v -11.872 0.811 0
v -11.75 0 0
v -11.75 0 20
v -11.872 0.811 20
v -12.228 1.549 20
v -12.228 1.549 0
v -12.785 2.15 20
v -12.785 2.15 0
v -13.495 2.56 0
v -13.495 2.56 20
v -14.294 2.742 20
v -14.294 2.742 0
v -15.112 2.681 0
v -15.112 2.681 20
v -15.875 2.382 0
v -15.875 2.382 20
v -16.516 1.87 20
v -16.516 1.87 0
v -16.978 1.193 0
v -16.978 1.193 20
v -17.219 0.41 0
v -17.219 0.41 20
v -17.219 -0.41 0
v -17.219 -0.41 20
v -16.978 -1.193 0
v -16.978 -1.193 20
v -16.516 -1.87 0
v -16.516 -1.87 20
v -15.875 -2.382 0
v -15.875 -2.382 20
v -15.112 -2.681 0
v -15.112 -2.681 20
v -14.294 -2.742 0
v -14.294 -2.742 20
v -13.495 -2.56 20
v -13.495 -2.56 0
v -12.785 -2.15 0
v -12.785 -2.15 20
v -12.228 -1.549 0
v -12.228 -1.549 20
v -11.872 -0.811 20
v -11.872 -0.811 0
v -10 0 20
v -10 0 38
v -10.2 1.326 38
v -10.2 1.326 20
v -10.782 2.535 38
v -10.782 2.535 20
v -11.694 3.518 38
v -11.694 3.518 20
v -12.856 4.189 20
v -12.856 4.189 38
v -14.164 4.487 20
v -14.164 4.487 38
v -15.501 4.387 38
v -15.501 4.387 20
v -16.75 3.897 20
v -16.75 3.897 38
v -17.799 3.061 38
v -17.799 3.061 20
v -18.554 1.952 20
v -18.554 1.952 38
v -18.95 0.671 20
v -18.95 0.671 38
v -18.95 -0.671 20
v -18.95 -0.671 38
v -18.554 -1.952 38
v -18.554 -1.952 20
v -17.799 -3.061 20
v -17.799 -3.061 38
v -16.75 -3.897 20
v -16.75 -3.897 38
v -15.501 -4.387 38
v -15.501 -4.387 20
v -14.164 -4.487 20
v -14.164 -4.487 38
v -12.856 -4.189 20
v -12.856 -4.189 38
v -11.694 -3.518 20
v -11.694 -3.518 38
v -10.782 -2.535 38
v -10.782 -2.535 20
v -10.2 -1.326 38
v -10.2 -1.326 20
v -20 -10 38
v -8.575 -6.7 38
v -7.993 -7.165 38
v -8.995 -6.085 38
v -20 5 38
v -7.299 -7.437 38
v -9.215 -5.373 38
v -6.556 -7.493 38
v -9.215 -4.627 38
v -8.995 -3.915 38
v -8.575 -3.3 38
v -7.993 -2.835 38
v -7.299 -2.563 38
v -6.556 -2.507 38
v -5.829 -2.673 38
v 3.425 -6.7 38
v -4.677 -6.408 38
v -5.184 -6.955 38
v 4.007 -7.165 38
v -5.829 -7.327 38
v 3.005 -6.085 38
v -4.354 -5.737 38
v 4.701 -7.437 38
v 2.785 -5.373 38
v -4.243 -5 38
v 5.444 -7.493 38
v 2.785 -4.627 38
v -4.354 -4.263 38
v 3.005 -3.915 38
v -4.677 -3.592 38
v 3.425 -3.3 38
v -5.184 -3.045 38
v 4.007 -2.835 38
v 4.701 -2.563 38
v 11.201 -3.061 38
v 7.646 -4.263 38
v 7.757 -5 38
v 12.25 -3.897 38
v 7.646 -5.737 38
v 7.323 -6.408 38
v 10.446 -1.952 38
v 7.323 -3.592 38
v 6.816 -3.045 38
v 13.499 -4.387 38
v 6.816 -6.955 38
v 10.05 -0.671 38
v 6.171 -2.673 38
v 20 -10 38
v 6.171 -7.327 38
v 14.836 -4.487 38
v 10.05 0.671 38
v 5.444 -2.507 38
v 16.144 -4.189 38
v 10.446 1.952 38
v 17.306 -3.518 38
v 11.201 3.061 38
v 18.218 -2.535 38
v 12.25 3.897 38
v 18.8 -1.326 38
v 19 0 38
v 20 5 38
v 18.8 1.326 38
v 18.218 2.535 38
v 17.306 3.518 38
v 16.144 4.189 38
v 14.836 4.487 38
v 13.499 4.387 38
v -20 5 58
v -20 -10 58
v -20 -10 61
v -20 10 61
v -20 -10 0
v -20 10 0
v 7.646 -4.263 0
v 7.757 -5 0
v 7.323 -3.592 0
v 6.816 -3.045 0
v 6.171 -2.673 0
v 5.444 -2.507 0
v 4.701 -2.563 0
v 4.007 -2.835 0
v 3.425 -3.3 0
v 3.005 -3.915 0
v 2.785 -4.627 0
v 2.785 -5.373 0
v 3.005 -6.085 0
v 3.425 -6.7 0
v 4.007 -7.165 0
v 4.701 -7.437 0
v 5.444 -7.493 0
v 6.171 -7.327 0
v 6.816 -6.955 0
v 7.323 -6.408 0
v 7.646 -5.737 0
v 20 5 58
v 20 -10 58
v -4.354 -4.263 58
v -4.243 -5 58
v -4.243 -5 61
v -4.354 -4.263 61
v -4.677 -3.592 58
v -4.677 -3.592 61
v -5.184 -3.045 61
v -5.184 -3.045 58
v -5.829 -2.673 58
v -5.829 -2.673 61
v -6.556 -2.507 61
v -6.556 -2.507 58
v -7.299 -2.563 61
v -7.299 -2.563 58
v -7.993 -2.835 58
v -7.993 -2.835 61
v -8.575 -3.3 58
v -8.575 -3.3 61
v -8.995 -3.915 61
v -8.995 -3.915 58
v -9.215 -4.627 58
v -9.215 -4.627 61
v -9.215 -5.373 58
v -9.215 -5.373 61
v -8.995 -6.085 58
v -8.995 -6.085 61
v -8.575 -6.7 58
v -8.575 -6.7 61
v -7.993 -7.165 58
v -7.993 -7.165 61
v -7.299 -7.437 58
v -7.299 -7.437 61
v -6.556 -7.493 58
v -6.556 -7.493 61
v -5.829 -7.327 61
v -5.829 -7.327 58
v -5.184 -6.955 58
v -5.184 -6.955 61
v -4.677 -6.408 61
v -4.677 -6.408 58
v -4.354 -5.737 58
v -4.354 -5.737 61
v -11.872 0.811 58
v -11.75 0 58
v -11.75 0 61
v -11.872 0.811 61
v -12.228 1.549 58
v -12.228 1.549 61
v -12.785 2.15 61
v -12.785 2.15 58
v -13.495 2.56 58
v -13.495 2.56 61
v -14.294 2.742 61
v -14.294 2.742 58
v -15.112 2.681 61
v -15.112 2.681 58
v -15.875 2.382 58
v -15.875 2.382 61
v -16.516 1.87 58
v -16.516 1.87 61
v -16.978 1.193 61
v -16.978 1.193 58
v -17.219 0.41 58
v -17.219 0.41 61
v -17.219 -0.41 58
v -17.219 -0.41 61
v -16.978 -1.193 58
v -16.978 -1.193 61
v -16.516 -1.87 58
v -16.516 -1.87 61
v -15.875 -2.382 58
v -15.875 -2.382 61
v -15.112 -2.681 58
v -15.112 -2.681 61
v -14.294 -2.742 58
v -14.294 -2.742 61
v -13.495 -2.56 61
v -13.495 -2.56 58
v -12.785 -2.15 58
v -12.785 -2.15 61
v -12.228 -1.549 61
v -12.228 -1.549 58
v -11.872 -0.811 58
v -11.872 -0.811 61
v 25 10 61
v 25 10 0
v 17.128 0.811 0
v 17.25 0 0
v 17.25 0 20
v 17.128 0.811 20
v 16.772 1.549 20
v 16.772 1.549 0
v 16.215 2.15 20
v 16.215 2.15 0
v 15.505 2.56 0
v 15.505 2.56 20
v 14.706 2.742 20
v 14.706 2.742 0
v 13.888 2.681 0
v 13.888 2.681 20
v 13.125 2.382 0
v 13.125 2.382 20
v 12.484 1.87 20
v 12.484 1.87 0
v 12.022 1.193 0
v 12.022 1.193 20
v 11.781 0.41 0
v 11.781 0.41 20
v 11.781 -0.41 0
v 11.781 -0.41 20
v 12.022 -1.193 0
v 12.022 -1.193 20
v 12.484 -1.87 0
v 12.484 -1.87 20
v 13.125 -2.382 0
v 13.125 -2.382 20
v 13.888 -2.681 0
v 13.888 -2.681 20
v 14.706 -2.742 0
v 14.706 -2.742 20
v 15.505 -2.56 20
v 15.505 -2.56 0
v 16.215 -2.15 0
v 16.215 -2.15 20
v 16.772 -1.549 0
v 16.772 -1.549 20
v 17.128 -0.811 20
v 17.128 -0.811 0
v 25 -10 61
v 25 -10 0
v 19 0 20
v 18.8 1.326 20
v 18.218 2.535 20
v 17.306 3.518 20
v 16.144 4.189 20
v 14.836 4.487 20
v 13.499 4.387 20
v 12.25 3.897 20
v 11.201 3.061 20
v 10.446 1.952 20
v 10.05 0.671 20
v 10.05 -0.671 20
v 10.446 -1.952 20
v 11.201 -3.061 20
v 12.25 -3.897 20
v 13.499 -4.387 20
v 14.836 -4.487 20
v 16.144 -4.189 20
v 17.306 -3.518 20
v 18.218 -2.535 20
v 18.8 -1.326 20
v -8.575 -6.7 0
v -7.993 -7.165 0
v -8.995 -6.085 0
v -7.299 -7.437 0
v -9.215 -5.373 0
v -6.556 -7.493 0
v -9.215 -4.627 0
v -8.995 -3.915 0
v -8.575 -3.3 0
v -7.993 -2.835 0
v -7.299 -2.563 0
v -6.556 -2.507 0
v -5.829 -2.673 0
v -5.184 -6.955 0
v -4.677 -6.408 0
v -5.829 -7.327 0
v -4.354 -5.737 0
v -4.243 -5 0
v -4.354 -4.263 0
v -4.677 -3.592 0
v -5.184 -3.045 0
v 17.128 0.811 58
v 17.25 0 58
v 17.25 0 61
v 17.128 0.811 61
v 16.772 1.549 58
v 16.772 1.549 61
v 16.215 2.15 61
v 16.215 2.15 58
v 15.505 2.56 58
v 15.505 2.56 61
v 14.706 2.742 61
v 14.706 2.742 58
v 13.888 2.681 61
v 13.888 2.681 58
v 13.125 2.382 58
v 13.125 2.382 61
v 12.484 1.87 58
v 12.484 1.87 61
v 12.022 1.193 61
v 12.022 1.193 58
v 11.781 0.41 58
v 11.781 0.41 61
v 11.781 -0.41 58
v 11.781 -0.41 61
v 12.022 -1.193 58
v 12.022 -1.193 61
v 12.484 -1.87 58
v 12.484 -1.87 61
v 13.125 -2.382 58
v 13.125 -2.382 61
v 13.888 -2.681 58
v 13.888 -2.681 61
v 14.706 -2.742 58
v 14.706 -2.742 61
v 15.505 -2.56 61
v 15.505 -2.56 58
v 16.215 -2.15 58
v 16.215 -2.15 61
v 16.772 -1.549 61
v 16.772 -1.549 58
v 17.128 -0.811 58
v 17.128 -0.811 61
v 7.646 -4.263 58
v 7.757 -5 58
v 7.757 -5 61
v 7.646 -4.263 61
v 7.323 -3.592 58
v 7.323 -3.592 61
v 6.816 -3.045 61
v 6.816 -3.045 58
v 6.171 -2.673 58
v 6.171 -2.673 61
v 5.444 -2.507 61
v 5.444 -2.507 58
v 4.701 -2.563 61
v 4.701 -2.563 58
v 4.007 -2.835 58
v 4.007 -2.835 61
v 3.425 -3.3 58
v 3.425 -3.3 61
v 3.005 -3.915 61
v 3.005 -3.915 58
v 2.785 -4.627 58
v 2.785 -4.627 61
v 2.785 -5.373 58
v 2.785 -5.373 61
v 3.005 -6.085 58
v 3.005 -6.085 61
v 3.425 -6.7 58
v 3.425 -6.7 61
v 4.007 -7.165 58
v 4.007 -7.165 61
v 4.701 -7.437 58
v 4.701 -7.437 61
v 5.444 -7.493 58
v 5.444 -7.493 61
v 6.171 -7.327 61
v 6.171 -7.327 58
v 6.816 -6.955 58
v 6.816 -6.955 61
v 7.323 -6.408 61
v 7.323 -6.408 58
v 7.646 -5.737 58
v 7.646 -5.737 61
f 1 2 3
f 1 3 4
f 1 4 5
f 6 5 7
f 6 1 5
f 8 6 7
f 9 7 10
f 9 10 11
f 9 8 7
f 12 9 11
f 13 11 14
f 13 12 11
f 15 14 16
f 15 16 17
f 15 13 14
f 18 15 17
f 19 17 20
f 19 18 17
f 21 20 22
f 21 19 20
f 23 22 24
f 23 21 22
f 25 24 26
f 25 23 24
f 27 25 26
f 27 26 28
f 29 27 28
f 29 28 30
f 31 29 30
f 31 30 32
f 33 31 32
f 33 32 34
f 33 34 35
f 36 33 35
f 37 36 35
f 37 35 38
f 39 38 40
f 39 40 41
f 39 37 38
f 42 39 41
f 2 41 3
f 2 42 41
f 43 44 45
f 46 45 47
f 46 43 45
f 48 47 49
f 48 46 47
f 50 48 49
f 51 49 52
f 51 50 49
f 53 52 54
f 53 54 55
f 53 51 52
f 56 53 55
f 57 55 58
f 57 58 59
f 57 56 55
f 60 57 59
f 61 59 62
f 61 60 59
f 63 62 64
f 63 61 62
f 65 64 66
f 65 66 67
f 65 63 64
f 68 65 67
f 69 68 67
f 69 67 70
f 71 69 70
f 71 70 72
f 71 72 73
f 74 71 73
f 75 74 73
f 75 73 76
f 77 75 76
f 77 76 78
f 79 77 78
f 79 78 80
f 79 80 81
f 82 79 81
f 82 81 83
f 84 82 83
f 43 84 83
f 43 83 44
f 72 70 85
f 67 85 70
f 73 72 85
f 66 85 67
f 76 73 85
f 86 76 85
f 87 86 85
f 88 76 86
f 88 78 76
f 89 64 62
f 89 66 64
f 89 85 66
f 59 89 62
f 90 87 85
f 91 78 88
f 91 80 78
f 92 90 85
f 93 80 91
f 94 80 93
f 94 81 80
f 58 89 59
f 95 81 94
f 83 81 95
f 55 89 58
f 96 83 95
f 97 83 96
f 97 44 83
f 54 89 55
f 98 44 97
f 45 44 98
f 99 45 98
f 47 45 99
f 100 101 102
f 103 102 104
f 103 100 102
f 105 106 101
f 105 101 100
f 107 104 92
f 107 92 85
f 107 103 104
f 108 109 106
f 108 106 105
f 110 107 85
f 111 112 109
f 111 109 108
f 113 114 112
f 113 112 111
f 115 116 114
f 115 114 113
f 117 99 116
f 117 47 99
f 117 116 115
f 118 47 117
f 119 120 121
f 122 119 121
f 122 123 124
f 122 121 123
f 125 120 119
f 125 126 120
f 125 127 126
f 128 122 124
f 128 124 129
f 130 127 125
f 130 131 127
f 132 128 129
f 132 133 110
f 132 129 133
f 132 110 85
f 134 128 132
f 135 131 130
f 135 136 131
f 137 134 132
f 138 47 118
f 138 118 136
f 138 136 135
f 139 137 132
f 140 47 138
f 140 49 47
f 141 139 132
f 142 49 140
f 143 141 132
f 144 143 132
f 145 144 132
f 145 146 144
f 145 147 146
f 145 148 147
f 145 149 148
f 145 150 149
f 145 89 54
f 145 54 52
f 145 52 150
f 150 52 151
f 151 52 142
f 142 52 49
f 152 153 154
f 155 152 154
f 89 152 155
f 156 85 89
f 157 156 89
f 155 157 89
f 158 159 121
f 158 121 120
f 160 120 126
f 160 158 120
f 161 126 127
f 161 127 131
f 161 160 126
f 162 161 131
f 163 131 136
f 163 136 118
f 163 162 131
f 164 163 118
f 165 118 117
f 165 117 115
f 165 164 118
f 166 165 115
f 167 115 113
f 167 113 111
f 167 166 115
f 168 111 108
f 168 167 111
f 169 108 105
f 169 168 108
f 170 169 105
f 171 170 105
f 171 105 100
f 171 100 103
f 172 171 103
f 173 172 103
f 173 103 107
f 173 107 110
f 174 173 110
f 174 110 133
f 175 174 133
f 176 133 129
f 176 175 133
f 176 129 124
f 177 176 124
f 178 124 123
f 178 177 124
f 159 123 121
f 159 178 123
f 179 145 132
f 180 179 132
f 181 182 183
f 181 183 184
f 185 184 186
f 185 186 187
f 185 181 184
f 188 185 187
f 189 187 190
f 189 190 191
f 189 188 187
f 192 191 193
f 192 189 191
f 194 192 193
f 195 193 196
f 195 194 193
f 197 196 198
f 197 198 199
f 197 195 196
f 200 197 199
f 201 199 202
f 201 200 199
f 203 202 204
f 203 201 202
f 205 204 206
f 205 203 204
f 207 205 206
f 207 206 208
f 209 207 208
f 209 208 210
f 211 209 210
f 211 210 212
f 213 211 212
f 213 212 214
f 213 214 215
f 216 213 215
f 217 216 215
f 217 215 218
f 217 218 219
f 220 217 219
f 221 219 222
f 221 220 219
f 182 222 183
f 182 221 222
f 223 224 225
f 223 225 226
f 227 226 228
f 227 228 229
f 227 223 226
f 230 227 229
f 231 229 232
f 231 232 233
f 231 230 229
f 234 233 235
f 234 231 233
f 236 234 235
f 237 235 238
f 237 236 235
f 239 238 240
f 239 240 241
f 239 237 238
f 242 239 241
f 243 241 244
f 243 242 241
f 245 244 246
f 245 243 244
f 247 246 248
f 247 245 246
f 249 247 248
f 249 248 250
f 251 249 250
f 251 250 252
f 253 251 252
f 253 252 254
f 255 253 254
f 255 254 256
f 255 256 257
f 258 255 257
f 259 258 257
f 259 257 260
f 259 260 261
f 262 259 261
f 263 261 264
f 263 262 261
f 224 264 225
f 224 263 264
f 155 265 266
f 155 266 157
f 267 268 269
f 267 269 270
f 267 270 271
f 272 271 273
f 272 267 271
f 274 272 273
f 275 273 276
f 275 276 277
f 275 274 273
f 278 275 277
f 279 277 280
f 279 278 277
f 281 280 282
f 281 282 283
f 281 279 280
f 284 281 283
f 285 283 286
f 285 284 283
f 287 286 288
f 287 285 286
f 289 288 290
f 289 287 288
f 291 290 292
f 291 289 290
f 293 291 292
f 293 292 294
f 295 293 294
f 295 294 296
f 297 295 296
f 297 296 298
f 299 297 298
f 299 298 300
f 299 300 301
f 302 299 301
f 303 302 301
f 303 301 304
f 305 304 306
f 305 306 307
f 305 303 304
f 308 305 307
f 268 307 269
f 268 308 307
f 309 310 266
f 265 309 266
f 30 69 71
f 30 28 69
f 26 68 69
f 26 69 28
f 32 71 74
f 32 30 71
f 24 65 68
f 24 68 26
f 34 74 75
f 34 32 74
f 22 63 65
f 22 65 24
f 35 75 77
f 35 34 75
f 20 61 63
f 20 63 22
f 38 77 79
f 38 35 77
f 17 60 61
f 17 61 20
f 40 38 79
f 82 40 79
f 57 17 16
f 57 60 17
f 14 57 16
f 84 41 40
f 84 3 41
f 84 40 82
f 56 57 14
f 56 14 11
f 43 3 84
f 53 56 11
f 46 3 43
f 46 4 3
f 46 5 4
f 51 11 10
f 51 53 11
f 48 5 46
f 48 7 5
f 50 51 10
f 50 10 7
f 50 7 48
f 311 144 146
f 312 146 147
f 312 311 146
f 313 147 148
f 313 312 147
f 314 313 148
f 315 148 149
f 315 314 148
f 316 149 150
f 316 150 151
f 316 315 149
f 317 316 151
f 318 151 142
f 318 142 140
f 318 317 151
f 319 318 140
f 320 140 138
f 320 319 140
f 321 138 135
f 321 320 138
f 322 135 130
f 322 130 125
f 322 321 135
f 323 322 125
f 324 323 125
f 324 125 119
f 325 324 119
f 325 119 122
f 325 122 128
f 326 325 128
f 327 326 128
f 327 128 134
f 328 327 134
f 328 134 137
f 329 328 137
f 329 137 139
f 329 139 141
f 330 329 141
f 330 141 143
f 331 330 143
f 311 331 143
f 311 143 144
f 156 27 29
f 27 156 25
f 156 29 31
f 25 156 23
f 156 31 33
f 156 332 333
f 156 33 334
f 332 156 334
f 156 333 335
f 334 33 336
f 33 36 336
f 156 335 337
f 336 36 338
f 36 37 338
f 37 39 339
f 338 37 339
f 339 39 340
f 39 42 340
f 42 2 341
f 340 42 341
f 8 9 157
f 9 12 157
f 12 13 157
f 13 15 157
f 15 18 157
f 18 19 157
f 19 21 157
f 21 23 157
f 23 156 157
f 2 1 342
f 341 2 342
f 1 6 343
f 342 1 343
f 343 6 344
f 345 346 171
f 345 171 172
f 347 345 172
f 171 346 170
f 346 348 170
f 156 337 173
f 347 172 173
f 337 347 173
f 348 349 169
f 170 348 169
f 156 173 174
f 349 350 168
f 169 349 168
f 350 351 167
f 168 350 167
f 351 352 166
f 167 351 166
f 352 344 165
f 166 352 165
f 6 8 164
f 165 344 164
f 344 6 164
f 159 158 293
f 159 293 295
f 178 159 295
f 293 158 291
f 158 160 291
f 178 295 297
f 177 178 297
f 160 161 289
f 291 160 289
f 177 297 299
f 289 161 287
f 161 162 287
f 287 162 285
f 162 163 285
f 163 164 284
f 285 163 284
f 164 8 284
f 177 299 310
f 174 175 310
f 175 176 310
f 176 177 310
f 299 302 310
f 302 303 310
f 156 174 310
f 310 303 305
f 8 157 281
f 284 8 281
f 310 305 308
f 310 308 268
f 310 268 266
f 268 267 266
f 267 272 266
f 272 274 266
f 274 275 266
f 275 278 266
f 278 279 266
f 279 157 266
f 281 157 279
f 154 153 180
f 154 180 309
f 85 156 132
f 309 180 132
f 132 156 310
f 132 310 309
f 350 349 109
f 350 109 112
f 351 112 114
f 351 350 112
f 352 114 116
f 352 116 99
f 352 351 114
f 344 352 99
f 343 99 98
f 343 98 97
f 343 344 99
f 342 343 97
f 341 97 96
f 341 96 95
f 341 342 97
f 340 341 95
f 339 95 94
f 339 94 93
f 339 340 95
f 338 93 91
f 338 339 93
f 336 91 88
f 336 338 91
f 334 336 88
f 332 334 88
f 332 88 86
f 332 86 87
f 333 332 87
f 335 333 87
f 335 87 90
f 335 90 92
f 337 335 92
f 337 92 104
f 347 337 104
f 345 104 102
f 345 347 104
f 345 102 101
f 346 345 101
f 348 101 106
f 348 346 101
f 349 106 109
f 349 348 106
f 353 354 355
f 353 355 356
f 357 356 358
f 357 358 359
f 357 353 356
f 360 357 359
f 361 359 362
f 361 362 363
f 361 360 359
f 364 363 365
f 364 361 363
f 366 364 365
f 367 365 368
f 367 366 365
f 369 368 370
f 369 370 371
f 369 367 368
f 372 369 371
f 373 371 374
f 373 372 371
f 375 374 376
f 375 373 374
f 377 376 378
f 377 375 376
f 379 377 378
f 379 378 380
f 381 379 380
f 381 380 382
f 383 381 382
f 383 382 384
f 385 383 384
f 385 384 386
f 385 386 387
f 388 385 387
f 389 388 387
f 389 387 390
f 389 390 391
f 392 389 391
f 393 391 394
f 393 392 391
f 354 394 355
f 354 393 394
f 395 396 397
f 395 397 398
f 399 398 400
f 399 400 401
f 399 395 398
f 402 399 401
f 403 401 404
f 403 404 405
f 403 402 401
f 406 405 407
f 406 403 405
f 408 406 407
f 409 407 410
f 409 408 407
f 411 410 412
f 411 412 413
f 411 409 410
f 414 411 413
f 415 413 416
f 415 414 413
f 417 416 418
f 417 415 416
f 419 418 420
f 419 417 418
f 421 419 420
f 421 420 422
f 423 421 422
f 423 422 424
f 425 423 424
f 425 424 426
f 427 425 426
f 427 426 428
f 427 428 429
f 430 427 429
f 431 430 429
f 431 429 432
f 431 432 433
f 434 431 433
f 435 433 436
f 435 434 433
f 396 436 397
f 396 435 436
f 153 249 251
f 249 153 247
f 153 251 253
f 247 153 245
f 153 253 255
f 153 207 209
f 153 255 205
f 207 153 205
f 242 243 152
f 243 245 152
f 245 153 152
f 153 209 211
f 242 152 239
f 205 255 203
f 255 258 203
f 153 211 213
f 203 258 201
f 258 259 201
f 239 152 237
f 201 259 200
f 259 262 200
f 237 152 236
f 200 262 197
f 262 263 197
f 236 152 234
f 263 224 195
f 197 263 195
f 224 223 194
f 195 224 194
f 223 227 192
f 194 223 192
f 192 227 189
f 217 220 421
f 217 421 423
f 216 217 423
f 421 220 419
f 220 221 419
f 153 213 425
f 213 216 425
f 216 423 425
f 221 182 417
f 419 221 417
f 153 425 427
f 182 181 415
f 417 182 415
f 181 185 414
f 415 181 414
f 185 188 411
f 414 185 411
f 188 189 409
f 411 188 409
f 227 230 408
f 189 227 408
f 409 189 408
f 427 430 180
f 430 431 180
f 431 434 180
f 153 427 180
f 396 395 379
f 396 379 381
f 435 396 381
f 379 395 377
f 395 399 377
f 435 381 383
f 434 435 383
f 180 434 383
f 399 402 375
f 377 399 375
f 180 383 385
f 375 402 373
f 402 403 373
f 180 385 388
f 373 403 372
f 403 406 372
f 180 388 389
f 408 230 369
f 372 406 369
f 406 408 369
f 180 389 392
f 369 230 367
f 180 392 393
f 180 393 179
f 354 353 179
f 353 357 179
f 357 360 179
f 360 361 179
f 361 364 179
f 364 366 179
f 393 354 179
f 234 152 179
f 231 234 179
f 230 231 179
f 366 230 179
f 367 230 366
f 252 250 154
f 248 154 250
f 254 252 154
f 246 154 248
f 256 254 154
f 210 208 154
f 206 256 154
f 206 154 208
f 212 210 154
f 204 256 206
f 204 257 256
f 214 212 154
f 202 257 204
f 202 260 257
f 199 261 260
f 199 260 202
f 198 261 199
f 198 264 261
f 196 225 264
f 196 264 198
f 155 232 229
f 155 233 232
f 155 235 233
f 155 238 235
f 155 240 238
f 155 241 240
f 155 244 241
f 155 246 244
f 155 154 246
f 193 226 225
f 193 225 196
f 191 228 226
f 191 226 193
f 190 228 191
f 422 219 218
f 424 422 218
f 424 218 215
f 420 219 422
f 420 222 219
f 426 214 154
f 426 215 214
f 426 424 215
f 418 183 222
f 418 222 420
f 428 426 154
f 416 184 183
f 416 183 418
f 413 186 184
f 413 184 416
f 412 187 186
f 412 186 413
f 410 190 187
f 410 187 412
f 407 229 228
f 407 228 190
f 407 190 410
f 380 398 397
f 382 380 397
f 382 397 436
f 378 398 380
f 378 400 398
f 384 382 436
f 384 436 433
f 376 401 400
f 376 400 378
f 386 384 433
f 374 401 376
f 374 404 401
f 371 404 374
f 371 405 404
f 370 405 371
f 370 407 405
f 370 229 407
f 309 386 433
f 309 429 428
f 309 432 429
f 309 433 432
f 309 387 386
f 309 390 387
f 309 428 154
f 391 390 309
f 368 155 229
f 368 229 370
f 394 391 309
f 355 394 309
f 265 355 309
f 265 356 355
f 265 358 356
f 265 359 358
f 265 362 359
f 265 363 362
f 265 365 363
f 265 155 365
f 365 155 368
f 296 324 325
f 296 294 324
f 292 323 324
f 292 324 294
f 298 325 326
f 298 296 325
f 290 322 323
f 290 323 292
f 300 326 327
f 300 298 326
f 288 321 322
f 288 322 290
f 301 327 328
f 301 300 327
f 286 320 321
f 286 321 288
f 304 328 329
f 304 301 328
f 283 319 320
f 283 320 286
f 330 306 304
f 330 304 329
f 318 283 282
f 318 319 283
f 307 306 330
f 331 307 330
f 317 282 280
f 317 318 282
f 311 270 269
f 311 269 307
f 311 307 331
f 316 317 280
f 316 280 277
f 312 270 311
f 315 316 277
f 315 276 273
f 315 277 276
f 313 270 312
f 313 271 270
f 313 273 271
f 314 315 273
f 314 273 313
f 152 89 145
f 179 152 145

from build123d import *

# Parameters (mm, degrees)
F0_W     = 40
F0_H     = 15
F0_R     = 2.5
F0_R_2   = 4.5
F1_DEPTH = 38
F0_H_2   = 5
F2_DEPTH = 61
F3_START = 58
F3_DEPTH = 3
F0_R_3   = 2.75
F4_DEPTH = 20
F5_START = 58
F5_DEPTH = 3


with BuildPart() as f1:
    # F0 (on Top) → F1 (new body)
    with BuildSketch(Plane.XY):
        with Locations((0, -2.5)):
            Rectangle(F0_W, F0_H)
        with Locations((-6.7427190952, -5)):
            Circle(F0_R, mode=Mode.SUBTRACT)
        with Locations((5.2572809048, -5)):
            Circle(F0_R, mode=Mode.SUBTRACT)
        with Locations((-14.5, 0)):
            Circle(F0_R_2, mode=Mode.SUBTRACT)
        with Locations((14.5, 0)):
            Circle(F0_R_2, mode=Mode.SUBTRACT)
    extrude(amount=F1_DEPTH)

    # F0 (on Top) → F2 (join)
    with BuildSketch(Plane.XY):
        Polygon((25, 10), (20, 10), (20, 5), (20, -10), (25, -10), align=None)
        with Locations((0, 7.5)):
            Rectangle(F0_W, F0_H_2)
    extrude(amount=F2_DEPTH)

    # F0 (on Top) → F3 (join)
    with BuildSketch(Plane.XY.offset(F3_START)):
        with Locations((0, -2.5)):
            Rectangle(F0_W, F0_H)
        with Locations((-6.7427190952, -5)):
            Circle(F0_R, mode=Mode.SUBTRACT)
        with Locations((5.2572809048, -5)):
            Circle(F0_R, mode=Mode.SUBTRACT)
        with Locations((-14.5, 0)):
            Circle(F0_R_2, mode=Mode.SUBTRACT)
        with Locations((14.5, 0)):
            Circle(F0_R_2, mode=Mode.SUBTRACT)
    extrude(amount=F3_DEPTH)

    # F0 (on Top) → F4 (join)
    with BuildSketch(Plane.XY):
        with Locations((-14.5, 0)):
            Circle(F0_R_2)
        with Locations((-14.5, 0)):
            Circle(F0_R_3, mode=Mode.SUBTRACT)
        with Locations((14.5, 0)):
            Circle(F0_R_2)
        with Locations((14.5, 0)):
            Circle(F0_R_3, mode=Mode.SUBTRACT)
    extrude(amount=F4_DEPTH)

    # F0 (on Top) → F5 (join)
    with BuildSketch(Plane.XY.offset(F5_START)):
        with Locations((-14.5, 0)):
            Circle(F0_R_2)
        with Locations((-14.5, 0)):
            Circle(F0_R_3, mode=Mode.SUBTRACT)
        with Locations((14.5, 0)):
            Circle(F0_R_2)
        with Locations((14.5, 0)):
            Circle(F0_R_3, mode=Mode.SUBTRACT)
    extrude(amount=F5_DEPTH)


solid = f1.part
